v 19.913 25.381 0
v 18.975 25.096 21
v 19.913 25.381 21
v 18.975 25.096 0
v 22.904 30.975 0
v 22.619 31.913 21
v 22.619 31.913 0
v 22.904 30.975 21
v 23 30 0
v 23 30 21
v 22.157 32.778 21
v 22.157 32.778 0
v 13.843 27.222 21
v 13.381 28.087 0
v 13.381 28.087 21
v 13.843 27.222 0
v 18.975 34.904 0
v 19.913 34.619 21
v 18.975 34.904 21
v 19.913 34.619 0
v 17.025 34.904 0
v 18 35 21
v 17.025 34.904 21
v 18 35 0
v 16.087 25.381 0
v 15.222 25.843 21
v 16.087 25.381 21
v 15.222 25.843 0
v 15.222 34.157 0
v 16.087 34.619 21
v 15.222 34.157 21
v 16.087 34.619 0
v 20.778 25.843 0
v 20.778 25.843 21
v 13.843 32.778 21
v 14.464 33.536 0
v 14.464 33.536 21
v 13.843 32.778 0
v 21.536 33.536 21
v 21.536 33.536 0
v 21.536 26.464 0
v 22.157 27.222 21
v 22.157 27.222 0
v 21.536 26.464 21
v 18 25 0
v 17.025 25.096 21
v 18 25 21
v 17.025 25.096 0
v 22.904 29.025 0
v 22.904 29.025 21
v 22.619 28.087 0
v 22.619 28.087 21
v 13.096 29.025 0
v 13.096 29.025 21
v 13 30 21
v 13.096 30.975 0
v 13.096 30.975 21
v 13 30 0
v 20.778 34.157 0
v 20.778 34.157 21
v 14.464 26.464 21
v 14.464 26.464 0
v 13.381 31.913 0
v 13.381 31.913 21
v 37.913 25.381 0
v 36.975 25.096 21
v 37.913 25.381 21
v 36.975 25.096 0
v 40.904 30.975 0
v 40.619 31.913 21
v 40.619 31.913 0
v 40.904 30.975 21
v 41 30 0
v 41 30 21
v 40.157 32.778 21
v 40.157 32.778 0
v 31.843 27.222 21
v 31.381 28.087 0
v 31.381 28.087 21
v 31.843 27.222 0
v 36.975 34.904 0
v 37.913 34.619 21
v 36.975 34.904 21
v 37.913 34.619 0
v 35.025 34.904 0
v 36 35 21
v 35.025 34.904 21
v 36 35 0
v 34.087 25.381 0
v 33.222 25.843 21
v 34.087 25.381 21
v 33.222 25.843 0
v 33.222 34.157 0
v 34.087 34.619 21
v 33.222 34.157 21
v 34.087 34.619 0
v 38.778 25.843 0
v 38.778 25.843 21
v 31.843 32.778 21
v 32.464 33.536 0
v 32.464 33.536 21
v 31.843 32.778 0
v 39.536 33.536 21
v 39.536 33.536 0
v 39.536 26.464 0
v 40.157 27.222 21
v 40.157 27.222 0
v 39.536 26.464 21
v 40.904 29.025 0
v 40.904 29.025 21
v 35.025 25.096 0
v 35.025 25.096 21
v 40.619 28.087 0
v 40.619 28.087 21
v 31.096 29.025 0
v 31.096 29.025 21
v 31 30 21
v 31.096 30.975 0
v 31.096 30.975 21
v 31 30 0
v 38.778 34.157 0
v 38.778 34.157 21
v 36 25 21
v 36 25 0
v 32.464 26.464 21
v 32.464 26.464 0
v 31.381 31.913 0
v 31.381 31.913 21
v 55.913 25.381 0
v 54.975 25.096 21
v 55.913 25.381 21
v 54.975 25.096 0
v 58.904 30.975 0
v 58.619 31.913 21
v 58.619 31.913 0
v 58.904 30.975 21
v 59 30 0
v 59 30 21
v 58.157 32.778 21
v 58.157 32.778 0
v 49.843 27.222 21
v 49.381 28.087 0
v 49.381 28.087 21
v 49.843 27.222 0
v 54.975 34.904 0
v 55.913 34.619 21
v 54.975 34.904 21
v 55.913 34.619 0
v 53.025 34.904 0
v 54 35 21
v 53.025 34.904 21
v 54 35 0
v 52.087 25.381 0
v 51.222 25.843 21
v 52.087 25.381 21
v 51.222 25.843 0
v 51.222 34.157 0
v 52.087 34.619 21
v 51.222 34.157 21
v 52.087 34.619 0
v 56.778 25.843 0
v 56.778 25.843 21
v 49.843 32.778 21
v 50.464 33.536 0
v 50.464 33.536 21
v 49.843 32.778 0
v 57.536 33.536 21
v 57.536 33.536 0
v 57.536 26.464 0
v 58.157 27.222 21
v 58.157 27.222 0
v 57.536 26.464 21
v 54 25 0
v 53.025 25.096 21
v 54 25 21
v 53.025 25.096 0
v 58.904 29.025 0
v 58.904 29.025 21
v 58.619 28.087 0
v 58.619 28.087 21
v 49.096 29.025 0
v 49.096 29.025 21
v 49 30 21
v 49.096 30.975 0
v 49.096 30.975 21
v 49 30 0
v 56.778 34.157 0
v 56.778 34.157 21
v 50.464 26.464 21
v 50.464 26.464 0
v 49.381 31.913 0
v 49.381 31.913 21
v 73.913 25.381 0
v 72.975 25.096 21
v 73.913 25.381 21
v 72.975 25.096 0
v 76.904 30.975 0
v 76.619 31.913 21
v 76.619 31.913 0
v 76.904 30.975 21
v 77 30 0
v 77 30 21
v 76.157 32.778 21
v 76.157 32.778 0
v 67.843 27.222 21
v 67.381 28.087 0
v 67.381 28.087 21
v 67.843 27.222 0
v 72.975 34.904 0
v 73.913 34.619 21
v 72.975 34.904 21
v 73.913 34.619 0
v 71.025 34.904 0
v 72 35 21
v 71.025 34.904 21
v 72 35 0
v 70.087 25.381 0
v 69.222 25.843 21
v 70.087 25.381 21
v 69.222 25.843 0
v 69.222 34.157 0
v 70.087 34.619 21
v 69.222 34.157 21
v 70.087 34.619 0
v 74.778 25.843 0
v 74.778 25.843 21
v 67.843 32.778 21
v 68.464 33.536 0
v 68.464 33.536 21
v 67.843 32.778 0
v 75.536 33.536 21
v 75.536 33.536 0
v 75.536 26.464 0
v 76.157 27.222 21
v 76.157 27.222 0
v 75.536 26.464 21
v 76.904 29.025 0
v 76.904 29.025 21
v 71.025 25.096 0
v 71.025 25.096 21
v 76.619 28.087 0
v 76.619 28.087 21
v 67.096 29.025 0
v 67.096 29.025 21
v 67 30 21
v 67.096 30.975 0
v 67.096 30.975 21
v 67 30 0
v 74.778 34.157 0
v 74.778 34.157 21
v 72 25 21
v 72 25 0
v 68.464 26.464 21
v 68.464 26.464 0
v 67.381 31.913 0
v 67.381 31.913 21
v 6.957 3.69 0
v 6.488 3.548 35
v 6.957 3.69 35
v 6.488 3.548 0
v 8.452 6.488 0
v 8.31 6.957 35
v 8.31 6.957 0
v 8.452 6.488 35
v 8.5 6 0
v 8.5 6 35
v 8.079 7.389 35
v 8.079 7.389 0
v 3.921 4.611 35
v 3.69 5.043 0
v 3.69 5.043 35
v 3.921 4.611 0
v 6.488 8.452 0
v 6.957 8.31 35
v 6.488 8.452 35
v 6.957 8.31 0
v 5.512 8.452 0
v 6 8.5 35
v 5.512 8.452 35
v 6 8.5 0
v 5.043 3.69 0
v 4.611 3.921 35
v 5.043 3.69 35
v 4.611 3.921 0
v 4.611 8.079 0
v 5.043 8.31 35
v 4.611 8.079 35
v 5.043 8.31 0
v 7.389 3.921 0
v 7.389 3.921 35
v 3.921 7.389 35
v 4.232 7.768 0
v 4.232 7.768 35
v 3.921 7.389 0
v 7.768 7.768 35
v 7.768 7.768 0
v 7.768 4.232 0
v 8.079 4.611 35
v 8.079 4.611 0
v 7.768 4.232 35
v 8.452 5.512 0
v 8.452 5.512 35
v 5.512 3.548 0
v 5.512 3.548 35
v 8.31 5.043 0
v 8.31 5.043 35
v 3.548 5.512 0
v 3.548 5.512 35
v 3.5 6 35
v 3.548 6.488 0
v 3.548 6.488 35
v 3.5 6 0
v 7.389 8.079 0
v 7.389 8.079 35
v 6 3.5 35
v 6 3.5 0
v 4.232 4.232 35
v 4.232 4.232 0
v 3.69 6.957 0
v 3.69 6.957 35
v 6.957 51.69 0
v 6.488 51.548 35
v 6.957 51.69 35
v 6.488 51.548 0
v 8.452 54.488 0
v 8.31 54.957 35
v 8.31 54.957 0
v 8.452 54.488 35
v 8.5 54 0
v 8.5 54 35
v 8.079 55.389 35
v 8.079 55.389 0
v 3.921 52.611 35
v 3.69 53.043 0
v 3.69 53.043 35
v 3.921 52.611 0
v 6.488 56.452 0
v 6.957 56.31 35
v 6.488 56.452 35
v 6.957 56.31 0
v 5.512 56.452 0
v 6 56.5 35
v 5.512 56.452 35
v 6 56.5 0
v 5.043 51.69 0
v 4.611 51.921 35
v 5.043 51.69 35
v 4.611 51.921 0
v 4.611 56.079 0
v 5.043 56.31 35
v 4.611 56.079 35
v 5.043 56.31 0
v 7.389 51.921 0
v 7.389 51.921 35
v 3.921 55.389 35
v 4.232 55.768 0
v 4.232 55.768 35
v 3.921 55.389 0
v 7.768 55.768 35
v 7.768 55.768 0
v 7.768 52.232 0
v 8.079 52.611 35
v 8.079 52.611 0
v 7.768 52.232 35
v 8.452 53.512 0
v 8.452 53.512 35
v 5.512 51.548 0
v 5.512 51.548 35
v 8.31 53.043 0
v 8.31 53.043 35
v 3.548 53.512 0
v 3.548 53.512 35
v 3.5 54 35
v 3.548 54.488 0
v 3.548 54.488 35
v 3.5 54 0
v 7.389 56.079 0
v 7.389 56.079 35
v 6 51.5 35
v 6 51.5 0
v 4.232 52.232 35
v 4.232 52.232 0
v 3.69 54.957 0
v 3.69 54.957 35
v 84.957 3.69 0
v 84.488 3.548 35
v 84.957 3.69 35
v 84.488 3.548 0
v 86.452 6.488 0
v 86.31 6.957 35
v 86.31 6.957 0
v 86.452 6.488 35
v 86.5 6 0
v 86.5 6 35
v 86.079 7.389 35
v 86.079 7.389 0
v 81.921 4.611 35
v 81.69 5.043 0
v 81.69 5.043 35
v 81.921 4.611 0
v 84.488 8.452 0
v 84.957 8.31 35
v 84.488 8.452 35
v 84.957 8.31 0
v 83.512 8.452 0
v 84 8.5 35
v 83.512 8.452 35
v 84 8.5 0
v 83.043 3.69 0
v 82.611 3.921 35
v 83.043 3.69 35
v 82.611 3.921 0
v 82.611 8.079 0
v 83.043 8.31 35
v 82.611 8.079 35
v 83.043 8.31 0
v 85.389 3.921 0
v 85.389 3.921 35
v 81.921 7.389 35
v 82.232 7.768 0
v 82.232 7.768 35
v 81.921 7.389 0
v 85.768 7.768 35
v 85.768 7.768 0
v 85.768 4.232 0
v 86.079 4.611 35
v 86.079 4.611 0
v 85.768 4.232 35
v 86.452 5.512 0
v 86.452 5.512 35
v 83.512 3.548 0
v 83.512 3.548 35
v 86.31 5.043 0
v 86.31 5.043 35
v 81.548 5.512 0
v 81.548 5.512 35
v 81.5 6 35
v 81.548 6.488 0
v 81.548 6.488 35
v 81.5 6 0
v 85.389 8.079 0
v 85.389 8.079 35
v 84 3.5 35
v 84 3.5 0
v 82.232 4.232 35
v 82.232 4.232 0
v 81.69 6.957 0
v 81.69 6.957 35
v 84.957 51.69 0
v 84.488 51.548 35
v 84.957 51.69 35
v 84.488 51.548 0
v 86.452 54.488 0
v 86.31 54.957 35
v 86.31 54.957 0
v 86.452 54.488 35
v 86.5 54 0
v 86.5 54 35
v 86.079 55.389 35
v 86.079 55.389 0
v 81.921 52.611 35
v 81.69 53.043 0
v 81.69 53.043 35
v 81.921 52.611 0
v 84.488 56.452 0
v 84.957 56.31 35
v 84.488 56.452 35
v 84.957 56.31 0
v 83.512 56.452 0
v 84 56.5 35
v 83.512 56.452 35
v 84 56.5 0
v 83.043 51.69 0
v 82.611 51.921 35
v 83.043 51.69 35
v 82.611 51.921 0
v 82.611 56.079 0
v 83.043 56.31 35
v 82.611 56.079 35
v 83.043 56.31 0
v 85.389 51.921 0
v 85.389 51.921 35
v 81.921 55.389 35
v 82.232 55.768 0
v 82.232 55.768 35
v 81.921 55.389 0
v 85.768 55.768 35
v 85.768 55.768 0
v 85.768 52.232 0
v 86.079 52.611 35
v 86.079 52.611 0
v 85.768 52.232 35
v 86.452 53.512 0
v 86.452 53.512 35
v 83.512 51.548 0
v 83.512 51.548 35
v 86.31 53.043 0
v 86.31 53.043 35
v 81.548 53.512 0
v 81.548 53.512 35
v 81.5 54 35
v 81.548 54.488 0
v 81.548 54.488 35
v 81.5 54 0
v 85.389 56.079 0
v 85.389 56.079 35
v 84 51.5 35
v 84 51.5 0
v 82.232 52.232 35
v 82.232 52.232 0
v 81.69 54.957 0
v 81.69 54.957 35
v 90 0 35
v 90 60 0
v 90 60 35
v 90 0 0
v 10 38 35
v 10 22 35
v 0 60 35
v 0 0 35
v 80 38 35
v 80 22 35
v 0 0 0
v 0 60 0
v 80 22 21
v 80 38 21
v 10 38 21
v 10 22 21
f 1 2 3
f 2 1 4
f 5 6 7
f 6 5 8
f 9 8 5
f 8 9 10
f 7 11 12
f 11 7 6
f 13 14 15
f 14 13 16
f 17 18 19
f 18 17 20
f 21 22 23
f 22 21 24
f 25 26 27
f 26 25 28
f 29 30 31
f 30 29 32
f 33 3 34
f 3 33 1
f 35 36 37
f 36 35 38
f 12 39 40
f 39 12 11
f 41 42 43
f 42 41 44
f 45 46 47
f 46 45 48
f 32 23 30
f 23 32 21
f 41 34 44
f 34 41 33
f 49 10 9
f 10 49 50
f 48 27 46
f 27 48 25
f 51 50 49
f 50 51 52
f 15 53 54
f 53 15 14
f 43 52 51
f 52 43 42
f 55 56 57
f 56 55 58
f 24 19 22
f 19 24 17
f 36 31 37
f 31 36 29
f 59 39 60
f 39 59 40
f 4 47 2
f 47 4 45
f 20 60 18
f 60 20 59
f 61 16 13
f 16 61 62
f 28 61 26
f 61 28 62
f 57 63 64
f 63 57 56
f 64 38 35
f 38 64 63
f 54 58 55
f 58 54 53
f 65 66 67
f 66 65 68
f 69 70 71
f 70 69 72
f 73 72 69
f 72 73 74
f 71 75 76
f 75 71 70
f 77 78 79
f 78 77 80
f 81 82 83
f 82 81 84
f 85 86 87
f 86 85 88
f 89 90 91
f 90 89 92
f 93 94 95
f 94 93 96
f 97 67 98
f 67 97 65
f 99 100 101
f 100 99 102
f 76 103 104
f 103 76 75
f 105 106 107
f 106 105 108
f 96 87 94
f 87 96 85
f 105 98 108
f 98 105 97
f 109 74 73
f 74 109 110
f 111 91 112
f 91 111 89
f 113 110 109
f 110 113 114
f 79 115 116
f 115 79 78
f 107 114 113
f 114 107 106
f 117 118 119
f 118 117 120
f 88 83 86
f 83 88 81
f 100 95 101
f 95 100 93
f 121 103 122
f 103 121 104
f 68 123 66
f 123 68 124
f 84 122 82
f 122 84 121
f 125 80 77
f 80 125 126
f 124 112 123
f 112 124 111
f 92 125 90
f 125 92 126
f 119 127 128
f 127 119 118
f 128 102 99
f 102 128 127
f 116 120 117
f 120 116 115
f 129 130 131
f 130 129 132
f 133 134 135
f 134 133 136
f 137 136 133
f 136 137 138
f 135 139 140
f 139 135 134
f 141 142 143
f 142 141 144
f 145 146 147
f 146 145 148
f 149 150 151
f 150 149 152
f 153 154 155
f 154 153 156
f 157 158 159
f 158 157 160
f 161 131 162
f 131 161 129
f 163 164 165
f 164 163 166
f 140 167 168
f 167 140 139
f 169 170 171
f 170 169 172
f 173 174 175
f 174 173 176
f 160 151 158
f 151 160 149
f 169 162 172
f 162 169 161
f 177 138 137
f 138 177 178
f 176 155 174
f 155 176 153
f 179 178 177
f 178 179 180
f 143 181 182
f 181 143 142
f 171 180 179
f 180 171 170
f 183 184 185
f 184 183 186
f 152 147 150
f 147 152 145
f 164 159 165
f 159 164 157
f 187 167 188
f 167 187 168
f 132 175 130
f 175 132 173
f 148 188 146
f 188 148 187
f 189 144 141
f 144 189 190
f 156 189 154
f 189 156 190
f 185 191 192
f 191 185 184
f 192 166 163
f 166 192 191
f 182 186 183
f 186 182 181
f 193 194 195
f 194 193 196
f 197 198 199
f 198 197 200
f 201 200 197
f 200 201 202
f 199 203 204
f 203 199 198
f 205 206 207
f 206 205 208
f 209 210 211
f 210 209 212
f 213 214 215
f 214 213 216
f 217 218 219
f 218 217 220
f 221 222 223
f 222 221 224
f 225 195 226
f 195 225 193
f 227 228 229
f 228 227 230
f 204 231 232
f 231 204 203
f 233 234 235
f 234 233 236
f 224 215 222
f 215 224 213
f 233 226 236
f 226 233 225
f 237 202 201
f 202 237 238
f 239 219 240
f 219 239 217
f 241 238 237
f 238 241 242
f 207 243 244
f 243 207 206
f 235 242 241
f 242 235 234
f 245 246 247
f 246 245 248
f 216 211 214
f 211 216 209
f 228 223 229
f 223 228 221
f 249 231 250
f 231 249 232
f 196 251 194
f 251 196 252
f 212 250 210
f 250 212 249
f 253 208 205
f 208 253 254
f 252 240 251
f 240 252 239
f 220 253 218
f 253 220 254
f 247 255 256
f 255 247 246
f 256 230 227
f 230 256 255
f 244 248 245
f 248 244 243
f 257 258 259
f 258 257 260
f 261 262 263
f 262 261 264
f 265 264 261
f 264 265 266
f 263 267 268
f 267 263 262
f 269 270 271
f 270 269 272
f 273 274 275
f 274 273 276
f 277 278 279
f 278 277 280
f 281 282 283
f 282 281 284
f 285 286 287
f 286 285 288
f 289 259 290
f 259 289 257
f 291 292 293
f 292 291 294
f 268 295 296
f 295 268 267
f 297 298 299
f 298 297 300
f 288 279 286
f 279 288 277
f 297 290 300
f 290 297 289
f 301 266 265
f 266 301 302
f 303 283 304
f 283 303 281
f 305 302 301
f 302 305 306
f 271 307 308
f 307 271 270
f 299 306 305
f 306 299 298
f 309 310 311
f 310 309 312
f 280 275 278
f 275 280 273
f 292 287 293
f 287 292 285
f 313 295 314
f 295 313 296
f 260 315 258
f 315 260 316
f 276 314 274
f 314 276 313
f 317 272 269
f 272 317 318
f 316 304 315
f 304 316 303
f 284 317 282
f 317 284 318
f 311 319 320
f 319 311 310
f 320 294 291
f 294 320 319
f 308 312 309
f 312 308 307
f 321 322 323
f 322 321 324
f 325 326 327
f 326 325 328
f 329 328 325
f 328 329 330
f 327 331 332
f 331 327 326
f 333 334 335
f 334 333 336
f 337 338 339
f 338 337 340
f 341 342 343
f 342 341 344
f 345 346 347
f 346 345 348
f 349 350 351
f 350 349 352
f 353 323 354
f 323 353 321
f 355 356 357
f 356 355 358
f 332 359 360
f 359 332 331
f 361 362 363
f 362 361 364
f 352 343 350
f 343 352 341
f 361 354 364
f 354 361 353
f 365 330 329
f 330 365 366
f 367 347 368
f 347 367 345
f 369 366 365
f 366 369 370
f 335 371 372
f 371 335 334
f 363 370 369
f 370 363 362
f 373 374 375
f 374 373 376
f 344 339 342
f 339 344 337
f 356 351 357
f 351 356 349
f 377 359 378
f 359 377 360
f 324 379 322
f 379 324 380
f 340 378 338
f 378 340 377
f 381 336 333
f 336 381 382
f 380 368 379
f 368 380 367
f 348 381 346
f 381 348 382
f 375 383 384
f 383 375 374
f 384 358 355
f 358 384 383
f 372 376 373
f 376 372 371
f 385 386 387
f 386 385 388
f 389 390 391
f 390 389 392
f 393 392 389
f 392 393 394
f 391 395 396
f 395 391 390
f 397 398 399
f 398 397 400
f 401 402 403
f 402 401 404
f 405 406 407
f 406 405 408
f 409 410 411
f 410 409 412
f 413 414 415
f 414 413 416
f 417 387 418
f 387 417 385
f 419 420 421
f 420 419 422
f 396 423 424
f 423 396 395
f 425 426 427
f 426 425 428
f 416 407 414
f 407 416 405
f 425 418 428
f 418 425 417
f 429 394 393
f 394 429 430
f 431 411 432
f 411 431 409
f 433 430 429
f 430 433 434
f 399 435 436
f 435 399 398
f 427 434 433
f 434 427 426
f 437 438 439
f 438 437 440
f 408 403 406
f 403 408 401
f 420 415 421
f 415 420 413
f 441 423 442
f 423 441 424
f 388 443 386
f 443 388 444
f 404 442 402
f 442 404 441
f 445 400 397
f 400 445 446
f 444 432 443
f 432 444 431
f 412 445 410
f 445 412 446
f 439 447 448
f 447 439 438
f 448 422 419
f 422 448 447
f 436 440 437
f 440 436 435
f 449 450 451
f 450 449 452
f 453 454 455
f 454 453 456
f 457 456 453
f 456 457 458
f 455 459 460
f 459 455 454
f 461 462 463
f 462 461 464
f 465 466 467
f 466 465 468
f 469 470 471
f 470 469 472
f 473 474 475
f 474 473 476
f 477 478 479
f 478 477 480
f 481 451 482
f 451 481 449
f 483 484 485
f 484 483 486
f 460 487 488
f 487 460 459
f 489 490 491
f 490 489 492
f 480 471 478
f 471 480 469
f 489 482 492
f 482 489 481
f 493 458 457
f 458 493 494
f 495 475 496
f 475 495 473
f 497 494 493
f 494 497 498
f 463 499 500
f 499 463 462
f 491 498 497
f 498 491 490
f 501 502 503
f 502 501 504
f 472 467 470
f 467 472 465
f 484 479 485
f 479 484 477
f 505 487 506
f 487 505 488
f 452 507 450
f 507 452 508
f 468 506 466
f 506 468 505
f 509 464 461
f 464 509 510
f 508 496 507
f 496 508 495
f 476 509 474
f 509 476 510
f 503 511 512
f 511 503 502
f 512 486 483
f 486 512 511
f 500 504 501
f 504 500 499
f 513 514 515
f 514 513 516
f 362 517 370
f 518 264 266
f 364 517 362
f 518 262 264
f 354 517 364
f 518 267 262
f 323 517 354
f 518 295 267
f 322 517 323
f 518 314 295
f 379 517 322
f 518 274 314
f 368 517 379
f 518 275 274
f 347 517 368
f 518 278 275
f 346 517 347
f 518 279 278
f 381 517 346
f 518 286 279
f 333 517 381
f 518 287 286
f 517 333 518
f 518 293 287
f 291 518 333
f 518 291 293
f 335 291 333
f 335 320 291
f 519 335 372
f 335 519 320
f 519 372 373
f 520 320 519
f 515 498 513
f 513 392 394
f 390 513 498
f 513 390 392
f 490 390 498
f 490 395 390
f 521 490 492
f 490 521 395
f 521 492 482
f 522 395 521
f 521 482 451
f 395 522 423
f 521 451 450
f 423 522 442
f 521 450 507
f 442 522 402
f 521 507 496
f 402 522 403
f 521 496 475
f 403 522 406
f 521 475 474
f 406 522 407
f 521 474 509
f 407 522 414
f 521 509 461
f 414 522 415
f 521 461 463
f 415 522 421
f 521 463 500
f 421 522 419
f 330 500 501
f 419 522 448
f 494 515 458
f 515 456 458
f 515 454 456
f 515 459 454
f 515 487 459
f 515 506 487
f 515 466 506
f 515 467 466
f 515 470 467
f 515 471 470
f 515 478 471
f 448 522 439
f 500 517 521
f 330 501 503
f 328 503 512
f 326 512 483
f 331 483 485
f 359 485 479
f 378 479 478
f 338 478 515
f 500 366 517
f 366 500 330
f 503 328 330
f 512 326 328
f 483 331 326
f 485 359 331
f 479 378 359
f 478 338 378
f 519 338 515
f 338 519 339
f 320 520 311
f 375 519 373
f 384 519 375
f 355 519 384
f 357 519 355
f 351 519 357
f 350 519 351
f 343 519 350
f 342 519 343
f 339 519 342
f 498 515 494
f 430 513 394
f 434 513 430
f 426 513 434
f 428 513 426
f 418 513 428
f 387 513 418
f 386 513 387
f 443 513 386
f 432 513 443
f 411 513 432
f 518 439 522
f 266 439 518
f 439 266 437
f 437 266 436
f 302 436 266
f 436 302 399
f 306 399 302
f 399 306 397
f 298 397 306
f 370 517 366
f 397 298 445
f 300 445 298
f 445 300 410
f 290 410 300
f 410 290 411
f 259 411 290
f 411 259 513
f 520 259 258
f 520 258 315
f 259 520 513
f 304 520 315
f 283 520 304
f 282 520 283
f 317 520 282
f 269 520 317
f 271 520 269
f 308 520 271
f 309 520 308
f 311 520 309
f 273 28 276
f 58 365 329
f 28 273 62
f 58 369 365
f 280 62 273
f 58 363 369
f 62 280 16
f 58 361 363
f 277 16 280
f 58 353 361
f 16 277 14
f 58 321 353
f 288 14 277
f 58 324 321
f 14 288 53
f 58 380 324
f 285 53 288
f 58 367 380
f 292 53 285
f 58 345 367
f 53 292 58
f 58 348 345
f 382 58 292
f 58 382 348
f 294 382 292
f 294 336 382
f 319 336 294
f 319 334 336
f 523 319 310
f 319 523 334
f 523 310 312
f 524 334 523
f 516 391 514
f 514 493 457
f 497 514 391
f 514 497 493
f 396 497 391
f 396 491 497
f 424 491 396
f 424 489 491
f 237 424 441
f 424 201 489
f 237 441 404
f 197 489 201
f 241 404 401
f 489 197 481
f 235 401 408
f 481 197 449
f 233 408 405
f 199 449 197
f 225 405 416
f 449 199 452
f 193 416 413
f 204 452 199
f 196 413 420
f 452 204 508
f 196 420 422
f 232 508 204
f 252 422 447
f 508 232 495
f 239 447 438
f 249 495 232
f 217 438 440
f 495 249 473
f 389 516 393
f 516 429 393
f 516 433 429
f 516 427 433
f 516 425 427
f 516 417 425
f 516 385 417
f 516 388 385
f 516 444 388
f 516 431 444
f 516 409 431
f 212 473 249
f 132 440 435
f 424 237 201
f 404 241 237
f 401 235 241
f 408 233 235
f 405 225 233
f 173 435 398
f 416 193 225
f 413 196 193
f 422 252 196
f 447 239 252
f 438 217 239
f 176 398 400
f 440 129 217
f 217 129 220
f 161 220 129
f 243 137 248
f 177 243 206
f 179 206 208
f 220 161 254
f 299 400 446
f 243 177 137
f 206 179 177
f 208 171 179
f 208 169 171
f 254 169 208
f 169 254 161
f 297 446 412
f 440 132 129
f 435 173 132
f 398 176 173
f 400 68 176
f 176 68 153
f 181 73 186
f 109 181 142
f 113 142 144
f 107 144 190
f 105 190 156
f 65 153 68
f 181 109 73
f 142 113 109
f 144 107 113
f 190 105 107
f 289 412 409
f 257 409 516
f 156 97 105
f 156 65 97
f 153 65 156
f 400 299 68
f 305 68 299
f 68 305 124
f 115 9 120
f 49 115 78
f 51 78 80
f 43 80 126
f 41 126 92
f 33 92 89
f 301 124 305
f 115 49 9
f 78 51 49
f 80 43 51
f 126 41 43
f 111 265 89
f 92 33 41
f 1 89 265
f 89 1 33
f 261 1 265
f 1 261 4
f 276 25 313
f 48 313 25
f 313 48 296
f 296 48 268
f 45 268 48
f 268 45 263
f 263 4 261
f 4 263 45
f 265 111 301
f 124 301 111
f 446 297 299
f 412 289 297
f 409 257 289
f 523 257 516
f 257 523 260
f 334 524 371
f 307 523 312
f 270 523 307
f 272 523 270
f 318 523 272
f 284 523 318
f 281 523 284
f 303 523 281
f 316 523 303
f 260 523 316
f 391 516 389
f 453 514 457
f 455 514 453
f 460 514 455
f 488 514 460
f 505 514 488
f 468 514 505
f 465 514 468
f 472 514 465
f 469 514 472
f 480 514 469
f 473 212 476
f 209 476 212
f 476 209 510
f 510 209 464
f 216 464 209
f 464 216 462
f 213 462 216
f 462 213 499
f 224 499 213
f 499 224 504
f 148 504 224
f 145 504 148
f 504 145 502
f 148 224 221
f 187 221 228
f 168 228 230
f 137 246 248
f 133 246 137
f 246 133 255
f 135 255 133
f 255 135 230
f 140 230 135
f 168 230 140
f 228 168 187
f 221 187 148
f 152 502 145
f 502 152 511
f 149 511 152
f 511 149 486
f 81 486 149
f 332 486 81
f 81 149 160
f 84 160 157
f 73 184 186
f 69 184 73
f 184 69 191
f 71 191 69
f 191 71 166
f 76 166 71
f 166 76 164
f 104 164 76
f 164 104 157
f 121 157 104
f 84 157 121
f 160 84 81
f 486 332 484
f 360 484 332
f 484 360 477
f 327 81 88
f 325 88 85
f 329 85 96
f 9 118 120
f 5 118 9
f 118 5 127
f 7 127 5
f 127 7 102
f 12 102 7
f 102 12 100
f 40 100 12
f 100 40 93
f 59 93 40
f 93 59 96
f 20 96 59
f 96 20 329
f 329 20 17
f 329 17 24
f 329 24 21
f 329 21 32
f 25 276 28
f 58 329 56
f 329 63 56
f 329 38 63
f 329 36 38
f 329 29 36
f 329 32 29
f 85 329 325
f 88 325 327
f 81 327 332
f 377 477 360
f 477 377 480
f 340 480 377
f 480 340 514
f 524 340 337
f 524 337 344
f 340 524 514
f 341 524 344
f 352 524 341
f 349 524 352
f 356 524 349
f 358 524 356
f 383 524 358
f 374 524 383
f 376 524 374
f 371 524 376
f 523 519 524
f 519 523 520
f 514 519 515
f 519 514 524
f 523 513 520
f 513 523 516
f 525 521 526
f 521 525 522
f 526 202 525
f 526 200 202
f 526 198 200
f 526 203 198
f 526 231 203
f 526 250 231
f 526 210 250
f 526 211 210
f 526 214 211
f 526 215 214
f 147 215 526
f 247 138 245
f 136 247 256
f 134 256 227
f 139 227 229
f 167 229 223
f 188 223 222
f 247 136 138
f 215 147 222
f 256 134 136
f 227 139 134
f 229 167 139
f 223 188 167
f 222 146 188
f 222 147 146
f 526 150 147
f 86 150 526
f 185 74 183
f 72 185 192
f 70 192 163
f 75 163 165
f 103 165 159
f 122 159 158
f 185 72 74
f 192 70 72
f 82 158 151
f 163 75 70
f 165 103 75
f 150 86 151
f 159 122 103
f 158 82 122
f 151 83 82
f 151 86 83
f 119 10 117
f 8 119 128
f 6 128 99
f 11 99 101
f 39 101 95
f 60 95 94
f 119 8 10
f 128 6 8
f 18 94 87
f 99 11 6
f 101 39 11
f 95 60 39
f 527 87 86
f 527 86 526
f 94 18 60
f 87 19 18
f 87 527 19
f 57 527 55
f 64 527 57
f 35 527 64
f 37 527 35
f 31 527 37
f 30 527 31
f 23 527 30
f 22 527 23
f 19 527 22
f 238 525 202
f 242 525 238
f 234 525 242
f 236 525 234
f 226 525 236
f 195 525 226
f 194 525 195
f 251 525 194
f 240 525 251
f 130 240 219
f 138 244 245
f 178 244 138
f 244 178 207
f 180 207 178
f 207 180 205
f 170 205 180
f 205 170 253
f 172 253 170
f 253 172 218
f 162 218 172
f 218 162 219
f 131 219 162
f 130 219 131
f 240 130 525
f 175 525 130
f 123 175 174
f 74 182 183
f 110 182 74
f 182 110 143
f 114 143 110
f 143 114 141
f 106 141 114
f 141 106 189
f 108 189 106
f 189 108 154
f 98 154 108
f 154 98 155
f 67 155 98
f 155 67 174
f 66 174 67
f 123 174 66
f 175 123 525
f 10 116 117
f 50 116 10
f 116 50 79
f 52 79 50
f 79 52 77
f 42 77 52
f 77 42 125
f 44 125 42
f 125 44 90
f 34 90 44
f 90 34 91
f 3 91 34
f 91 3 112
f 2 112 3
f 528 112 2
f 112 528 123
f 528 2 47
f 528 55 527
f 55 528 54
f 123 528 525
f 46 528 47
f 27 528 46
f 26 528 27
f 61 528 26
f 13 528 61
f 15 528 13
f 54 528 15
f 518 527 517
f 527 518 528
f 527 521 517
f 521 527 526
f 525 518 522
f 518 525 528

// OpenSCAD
$fn = 32;

// ----------------------------------------------------------------------
// Manifold block: gallery_top manifold
// ----------------------------------------------------------------------

// --- parameters (mm) ---
block_l = 90;             // block length, X
block_w = 60;             // block width, Y
block_h = 35;             // block height, Z
port_d = 10;              // port bore diameter
port_pitch = 18;          // port pitch along X
gallery_d = 16;           // top gallery width, Y
gallery_depth = 14;       // gallery pocket depth
wall_p = 10;              // gallery end wall thickness, X
mnt_d = 5;                // mounting hole diameter
mnt_in = 6;               // mounting hole inset from the edges

n_ports = 4;  // ports in the row
port_x0 = (block_l - (n_ports - 1) * port_pitch) / 2;  // first port X

difference() {
  cube([block_l, block_w, block_h]);
  for (i = [0 : n_ports - 1])
    translate([port_x0 + i * port_pitch, block_w / 2, -1])
      cylinder(h = block_h + 2, d = port_d);
  translate([wall_p, block_w / 2 - gallery_d / 2, block_h - gallery_depth])
    cube([block_l - 2 * wall_p, gallery_d, gallery_depth + 1]);
  for (cx = [mnt_in, block_l - mnt_in])
    for (cy = [mnt_in, block_w - mnt_in])
      translate([cx, cy, -1]) cylinder(h = block_h + 2, d = mnt_d);
}
